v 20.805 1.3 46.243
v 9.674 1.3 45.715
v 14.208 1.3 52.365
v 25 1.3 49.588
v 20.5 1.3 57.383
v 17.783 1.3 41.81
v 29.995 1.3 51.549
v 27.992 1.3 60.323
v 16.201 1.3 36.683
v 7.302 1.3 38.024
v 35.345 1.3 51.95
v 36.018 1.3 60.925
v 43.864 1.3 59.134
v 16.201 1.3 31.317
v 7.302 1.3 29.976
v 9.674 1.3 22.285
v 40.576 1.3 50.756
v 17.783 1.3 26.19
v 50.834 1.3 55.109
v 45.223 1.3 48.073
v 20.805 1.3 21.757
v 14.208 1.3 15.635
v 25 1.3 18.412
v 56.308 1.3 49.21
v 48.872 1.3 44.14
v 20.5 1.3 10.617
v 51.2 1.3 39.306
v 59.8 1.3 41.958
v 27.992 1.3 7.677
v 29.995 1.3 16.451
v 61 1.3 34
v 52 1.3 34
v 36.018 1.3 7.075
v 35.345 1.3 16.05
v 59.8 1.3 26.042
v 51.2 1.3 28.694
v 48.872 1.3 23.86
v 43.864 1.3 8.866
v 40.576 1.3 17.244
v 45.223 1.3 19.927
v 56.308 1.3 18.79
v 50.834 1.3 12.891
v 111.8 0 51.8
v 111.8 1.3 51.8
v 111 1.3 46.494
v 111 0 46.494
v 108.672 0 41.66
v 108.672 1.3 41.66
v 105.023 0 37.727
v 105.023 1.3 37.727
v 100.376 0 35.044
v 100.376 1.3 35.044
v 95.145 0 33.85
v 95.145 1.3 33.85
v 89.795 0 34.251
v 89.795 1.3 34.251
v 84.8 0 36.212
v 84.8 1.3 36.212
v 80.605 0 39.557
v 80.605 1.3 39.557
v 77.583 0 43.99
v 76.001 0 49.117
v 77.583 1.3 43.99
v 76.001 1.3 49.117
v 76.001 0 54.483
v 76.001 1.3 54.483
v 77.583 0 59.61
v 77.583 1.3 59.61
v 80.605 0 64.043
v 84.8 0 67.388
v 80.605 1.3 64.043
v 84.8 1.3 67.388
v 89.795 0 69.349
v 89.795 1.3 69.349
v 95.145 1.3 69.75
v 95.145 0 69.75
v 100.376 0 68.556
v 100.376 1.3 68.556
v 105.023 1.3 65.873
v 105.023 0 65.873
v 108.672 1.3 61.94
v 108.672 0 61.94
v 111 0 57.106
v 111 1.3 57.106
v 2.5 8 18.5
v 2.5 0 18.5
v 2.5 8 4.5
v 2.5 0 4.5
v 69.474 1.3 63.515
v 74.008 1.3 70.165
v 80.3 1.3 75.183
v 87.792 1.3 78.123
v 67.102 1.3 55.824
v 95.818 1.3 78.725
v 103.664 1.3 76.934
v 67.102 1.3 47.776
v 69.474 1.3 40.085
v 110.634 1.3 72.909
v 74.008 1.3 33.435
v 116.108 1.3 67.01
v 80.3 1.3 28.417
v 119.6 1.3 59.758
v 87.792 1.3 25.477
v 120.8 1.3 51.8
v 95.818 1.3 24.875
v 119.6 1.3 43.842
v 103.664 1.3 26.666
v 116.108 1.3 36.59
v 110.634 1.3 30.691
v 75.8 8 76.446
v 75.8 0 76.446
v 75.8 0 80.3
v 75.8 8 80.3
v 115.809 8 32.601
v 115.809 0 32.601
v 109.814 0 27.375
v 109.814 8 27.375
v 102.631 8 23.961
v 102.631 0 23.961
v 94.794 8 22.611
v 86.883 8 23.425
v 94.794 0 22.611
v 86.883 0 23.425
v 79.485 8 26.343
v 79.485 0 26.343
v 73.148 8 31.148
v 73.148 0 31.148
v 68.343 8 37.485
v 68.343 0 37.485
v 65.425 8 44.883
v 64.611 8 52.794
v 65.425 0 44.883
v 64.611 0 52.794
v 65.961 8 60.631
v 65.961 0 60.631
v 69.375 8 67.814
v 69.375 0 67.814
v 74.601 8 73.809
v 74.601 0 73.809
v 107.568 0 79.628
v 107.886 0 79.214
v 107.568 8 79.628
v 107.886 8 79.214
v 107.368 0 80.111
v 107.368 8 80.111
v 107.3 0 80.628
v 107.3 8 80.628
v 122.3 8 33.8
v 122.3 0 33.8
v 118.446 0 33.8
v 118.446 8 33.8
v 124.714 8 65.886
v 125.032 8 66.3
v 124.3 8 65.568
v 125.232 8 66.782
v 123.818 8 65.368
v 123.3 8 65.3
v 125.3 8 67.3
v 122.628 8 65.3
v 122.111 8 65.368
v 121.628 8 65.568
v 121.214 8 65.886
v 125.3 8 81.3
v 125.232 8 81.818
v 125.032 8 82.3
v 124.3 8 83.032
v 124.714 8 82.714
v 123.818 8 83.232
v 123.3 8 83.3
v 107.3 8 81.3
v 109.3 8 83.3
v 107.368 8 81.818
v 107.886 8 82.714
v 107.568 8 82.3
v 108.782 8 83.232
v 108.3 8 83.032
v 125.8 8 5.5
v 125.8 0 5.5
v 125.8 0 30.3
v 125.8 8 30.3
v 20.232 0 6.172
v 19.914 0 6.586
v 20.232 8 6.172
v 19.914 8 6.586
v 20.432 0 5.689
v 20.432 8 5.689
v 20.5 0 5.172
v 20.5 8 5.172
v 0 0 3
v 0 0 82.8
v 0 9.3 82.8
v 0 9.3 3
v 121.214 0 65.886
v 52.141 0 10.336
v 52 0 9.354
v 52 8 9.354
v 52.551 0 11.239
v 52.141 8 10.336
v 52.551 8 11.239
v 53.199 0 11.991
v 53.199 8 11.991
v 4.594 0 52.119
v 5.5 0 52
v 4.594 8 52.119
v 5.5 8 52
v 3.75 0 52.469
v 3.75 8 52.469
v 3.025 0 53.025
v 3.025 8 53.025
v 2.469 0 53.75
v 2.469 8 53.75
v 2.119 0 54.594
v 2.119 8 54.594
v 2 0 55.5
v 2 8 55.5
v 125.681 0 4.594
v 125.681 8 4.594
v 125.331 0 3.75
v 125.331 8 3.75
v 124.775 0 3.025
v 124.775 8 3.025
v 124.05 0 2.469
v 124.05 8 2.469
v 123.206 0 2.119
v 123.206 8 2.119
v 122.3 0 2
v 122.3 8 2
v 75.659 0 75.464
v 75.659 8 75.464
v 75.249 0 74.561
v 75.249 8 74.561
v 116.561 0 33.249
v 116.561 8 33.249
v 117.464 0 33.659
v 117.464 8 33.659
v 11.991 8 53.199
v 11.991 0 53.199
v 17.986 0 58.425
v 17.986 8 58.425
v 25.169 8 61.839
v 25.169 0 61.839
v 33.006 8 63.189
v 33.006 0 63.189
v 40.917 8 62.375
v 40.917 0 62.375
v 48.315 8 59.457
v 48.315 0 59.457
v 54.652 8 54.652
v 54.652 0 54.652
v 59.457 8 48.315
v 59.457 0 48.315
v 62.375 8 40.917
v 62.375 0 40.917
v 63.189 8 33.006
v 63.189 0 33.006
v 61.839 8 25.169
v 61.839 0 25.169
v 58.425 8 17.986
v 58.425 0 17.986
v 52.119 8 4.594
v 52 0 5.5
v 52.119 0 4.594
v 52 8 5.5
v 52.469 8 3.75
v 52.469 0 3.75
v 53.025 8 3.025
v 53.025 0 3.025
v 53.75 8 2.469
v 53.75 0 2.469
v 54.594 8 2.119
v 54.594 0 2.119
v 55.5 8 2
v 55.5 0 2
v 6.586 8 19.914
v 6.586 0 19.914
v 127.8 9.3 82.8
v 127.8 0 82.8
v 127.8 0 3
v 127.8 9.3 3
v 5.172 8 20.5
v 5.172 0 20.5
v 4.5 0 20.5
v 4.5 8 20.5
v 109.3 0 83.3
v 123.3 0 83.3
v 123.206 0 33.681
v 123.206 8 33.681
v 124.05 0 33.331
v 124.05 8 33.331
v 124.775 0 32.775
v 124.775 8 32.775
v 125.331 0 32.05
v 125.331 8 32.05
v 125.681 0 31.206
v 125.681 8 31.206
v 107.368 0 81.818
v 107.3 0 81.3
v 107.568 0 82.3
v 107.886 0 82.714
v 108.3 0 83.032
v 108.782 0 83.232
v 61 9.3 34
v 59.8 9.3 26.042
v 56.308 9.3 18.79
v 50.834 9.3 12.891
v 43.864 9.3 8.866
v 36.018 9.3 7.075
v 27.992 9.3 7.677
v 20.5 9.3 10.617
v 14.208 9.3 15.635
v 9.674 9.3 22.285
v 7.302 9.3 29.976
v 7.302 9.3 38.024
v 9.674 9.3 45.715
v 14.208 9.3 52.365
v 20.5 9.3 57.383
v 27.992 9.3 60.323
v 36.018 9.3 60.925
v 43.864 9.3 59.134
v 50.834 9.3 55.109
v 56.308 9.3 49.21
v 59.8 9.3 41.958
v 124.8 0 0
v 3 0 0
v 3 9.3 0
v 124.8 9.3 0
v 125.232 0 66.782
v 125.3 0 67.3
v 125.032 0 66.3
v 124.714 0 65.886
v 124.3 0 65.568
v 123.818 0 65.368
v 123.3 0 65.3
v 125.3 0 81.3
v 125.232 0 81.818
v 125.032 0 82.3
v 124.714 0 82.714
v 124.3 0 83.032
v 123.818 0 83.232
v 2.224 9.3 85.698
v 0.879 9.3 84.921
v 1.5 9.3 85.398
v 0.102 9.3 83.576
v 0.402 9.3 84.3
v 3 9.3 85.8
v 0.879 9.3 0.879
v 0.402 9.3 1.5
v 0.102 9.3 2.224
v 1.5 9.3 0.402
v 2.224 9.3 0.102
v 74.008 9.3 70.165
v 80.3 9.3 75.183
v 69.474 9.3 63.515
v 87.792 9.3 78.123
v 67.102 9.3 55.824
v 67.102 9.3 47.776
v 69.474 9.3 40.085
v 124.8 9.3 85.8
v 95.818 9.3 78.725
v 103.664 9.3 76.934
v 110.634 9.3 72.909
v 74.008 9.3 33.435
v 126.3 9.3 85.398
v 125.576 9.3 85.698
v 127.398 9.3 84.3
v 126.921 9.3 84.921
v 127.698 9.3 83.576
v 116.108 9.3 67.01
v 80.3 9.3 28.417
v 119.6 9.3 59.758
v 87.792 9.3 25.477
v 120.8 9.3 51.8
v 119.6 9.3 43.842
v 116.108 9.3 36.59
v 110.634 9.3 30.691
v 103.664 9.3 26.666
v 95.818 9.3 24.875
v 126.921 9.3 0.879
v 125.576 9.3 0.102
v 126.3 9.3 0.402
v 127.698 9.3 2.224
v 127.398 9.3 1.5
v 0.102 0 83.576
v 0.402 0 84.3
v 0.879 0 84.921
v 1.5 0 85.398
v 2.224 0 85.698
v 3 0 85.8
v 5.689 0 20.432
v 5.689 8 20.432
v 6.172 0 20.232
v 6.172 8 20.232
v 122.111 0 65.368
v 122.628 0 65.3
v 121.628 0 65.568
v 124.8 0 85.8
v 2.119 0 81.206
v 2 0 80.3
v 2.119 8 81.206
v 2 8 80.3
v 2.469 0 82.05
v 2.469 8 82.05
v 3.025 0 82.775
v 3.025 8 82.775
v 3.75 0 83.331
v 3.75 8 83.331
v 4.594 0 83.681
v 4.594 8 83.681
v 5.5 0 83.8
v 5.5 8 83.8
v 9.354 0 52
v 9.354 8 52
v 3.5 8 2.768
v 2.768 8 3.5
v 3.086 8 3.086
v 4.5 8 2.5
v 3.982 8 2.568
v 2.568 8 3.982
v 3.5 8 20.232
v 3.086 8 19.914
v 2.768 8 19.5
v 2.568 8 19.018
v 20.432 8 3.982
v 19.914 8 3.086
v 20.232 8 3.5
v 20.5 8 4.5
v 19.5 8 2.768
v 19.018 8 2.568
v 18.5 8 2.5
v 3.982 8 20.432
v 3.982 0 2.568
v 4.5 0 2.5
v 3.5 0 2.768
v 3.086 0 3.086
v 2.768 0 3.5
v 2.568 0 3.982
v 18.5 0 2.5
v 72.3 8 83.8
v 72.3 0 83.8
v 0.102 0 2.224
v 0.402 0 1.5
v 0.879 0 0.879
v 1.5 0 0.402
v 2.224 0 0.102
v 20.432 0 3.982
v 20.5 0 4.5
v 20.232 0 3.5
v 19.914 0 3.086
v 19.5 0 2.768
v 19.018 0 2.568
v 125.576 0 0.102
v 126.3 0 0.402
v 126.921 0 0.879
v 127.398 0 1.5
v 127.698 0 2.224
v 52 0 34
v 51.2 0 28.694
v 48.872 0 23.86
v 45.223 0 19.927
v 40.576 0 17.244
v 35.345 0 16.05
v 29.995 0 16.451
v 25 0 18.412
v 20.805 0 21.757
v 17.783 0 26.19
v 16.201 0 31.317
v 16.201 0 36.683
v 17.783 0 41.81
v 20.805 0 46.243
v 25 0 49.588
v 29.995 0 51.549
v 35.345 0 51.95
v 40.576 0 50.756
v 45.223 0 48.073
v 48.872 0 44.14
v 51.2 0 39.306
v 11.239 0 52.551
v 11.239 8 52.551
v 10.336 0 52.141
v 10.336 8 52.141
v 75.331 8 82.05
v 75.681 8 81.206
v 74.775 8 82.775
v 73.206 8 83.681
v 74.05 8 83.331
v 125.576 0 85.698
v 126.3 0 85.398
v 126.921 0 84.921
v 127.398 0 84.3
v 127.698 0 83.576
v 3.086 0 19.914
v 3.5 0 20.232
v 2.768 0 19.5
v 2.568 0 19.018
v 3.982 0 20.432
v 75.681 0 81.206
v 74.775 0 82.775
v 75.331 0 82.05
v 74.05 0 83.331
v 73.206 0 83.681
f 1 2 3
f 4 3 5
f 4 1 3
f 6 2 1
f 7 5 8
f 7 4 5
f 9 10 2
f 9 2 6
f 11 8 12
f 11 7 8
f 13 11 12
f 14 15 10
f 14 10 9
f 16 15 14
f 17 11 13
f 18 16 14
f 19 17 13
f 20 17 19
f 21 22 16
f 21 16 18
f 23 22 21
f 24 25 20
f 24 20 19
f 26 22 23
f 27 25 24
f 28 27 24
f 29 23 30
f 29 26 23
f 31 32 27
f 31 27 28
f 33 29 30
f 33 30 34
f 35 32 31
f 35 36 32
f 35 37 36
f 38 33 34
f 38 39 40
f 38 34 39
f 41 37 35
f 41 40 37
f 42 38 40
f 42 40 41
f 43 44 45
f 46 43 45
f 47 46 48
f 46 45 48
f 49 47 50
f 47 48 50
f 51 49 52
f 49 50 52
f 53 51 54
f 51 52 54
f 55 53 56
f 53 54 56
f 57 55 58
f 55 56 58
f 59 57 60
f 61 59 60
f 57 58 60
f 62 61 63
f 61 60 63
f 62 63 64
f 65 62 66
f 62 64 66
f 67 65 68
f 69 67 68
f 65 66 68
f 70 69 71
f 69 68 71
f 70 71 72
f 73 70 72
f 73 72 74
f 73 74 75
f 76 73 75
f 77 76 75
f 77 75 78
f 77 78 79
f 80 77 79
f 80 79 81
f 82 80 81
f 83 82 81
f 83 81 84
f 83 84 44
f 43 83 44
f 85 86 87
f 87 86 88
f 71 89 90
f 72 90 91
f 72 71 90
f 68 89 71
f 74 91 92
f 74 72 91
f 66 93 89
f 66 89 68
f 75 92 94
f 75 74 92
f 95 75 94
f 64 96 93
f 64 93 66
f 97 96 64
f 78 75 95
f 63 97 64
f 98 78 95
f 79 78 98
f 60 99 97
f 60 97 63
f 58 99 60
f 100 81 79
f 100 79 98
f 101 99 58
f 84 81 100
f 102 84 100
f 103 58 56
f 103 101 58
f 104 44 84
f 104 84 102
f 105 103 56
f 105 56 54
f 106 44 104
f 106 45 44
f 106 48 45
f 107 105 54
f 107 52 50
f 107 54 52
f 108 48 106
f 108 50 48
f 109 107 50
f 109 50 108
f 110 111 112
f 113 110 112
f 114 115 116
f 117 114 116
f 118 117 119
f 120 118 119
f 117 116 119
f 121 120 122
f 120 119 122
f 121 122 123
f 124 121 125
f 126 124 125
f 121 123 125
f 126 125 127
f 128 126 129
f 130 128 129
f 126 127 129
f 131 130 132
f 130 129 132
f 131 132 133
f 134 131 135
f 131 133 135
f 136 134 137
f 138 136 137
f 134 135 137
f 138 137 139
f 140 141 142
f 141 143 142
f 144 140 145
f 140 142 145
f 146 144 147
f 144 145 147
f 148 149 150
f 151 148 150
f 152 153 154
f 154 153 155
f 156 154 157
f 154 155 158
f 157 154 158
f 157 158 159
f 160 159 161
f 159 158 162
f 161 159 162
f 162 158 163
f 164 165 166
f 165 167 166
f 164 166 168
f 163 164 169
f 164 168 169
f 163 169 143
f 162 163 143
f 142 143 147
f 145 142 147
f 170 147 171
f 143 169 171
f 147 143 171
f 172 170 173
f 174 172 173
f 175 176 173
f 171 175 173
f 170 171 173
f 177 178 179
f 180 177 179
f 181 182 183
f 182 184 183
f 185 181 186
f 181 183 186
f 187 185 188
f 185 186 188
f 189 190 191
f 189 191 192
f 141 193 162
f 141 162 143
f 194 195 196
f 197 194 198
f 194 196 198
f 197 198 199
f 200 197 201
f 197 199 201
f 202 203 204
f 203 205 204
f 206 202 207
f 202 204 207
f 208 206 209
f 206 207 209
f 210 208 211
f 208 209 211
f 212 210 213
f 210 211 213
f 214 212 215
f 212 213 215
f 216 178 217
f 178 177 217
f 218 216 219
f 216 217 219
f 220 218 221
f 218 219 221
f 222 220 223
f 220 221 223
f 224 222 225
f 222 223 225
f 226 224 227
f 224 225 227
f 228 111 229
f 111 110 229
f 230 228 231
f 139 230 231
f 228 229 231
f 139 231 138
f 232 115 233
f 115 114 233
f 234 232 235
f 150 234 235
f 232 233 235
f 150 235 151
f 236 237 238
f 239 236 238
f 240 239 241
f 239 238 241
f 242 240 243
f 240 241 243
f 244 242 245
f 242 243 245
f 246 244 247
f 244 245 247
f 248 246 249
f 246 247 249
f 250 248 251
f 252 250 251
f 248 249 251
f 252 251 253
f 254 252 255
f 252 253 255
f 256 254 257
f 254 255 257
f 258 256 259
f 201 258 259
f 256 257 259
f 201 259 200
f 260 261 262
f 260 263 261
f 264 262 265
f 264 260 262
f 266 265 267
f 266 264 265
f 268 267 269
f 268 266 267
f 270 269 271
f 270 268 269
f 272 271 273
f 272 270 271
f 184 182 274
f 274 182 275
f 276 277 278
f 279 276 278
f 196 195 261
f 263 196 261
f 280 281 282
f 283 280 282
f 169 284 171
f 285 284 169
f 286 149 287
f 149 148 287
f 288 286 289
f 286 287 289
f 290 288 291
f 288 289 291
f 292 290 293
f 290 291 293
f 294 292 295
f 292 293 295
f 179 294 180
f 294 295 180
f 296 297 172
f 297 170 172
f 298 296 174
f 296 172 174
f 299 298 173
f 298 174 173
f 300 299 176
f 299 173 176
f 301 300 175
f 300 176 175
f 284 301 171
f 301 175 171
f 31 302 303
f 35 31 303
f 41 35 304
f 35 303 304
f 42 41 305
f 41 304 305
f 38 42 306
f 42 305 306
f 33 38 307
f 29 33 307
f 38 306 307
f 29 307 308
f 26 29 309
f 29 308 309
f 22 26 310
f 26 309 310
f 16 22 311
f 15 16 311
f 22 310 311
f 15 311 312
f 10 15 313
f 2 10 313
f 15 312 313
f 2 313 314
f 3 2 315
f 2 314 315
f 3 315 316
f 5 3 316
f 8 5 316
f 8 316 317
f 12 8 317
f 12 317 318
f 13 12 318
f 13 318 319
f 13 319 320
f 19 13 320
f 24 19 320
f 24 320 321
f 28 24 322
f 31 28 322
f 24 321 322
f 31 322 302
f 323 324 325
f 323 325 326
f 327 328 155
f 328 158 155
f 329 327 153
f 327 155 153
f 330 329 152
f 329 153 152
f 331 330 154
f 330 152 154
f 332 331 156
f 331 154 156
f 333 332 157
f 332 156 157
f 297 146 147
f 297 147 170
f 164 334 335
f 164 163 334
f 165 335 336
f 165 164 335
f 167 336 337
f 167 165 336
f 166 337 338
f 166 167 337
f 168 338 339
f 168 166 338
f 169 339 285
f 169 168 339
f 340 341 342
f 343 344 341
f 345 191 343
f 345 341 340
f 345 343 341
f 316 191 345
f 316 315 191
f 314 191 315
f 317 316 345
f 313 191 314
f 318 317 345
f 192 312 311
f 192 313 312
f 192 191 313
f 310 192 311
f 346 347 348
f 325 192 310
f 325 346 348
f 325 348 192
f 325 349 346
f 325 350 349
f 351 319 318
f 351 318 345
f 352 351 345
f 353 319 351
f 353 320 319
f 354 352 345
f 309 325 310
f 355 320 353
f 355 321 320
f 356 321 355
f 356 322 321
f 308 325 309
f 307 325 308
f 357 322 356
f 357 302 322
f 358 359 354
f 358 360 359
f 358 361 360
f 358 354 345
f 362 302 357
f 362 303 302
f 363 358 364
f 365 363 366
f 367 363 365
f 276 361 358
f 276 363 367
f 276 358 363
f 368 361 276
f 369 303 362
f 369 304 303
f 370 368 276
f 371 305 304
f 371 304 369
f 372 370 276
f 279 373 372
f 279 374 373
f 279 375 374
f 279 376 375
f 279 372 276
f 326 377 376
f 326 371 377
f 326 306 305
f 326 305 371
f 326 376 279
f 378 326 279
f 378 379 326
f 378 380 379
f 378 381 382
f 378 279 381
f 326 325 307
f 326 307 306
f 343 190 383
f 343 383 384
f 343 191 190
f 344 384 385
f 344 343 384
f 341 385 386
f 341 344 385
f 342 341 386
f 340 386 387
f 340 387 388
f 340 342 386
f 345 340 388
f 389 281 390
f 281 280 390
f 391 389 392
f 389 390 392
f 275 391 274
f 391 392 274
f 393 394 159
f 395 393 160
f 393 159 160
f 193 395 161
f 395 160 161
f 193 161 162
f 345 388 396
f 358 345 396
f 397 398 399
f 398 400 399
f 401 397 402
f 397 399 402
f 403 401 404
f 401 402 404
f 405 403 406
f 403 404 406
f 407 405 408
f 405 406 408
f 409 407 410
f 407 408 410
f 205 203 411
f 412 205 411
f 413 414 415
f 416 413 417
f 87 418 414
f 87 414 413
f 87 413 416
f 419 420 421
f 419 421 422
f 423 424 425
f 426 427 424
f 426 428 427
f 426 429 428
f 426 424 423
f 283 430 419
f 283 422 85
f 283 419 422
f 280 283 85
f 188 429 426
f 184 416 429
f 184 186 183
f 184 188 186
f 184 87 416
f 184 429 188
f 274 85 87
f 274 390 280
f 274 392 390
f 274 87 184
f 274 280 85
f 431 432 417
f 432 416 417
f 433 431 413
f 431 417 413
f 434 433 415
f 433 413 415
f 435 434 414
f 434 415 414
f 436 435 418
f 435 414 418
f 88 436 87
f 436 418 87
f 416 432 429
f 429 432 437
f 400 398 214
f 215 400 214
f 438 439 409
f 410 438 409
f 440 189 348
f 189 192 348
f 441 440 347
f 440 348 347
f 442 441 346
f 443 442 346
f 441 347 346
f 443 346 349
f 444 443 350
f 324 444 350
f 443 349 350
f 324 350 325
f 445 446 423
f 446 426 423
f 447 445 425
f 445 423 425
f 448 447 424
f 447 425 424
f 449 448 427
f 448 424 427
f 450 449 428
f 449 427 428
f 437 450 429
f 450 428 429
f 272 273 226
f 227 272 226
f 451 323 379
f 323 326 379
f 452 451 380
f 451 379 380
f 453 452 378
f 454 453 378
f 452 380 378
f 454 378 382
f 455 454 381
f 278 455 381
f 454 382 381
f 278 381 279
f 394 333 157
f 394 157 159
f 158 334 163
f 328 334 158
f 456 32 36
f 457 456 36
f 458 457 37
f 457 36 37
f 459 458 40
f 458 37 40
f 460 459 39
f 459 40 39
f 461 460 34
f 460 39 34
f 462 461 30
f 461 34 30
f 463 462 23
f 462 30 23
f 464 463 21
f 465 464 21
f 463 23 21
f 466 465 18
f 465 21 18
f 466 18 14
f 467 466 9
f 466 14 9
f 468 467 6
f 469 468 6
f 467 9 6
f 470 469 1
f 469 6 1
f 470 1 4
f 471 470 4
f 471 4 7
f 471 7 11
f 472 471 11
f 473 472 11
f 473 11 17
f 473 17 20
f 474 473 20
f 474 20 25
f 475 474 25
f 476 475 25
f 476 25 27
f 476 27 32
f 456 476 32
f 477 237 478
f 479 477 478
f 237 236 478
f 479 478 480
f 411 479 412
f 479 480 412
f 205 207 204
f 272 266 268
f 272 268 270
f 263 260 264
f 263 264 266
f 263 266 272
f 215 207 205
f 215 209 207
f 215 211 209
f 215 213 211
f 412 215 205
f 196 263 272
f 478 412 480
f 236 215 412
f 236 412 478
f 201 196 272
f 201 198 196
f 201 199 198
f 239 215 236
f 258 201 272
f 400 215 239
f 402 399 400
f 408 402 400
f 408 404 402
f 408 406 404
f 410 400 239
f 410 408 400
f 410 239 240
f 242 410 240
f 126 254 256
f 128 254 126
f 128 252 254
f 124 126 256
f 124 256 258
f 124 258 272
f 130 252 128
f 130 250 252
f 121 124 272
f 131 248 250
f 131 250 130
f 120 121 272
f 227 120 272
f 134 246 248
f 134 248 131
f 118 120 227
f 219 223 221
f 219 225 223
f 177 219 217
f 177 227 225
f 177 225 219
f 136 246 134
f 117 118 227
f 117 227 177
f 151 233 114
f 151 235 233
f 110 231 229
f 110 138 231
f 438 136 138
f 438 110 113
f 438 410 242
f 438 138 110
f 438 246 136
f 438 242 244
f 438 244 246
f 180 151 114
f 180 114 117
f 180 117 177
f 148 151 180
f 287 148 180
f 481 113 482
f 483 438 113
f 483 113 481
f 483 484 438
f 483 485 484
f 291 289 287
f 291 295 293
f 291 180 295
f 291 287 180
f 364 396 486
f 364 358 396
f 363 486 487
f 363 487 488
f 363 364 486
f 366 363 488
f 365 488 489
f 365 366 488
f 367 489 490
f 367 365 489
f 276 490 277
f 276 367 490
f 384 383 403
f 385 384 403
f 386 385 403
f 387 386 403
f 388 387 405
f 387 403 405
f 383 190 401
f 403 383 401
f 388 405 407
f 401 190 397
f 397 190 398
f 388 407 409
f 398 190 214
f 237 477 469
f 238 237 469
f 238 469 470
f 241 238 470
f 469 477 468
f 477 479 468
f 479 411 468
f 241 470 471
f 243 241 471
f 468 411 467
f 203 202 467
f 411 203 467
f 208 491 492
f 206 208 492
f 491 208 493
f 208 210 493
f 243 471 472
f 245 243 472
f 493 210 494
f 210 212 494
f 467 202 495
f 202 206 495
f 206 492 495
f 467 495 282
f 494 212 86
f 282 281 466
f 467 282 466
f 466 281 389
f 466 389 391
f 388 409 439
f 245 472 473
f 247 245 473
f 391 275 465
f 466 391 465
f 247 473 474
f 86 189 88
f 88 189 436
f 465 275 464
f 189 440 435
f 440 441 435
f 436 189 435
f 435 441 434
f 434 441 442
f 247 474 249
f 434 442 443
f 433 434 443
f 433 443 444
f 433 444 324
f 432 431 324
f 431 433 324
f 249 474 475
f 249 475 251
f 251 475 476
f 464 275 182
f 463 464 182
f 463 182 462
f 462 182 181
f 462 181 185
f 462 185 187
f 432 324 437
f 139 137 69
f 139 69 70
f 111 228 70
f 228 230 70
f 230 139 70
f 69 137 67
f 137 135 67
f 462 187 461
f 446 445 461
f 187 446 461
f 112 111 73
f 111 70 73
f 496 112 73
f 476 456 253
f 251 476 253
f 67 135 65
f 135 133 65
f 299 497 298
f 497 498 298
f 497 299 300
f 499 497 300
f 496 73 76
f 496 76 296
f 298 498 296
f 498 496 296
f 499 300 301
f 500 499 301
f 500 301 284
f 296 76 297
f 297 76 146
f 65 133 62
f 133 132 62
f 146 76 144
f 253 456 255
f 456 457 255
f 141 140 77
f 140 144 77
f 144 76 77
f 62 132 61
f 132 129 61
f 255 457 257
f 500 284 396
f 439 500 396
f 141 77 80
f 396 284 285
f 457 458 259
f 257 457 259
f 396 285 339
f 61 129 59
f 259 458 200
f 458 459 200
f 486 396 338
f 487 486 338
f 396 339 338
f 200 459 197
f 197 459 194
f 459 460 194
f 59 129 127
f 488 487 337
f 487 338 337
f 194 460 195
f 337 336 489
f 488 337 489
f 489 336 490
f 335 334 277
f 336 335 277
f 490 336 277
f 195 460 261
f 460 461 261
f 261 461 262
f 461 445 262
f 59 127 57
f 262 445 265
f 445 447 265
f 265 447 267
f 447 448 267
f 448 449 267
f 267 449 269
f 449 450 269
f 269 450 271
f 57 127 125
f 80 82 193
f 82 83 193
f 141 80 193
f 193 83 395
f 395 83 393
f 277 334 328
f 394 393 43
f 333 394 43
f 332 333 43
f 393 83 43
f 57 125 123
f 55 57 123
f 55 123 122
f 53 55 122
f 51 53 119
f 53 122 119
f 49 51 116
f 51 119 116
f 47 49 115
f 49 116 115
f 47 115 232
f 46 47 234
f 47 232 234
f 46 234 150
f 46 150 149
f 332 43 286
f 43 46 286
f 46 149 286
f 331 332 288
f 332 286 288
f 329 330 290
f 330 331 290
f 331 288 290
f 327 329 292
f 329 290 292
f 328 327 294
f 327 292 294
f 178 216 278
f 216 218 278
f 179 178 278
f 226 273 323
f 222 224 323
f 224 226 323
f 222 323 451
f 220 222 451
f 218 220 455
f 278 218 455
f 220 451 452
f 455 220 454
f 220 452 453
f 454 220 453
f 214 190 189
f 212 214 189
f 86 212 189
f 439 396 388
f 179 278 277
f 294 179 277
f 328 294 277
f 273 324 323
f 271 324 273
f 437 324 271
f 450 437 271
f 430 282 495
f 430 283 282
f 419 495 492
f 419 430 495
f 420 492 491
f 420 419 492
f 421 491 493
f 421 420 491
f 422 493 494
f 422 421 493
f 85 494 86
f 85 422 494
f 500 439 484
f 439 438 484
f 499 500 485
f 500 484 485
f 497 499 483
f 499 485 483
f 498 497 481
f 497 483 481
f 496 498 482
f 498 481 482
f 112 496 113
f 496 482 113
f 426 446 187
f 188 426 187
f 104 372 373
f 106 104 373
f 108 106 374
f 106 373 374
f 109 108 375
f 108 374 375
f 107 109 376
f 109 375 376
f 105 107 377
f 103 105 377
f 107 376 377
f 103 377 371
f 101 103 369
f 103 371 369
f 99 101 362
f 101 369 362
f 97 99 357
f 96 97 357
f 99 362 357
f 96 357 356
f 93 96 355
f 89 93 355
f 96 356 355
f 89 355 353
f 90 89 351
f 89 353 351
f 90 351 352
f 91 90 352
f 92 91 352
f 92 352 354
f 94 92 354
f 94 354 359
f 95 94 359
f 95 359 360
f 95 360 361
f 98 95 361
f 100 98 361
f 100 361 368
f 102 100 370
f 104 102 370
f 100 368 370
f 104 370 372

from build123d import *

# Parameters (mm, degrees)
SKETCH1_W           = 127.8
SKETCH1_H           = 85.8
BOSS_EXTRUDE1_DEPTH = 9.3
SKETCH2_R           = 27
CUT_EXTRUDE1_DEPTH  = 8
SKETCH3_R           = 18
CUT_EXTRUDE2_DEPTH  = 9
FILLET1_R           = 3
CUT_EXTRUDE3_DEPTH  = 8
FILLET2_R           = 2
FILLET3_R           = 3.5


with BuildPart() as part:
    # Sketch1 → Boss-Extrude1 (new body)
    with BuildSketch(Plane(origin=(0, 0, 0), x_dir=(1, 0, 0), z_dir=(0, 1, 0))):
        with Locations((63.9, -42.9)):
            Rectangle(SKETCH1_W, SKETCH1_H)
    extrude(amount=BOSS_EXTRUDE1_DEPTH)

    # Sketch2 → Cut-Extrude1 (cut)
    with BuildSketch(Plane(origin=(0, 9.3, 0), x_dir=(1, 0, 0), z_dir=(0, 1, 0))):
        with Locations((93.8, -51.8)):
            Circle(SKETCH2_R)
        with Locations((34, -34)):
            Circle(SKETCH2_R)
    extrude(amount=-CUT_EXTRUDE1_DEPTH, mode=Mode.SUBTRACT)

    # Sketch3 → Cut-Extrude2 (cut)
    with BuildSketch(Plane(origin=(0, 1.3, 0), x_dir=(1, 0, 0), z_dir=(0, 1, 0))):
        with Locations((93.8, -51.8)):
            Circle(SKETCH3_R)
        with Locations((34, -34)):
            Circle(SKETCH3_R)
    extrude(amount=-CUT_EXTRUDE2_DEPTH, mode=Mode.SUBTRACT)

    # Fillet1
    fillet1_edges = [part.edges().sort_by_distance(p)[0] for p in [
        (0, 4.65, 0),
        (127.8, 4.65, 0),
        (127.8, 4.65, 85.8),
        (0, 4.65, 85.8),
    ]]
    fillet(fillet1_edges, radius=FILLET1_R)

    # Sketch4 → Cut-Extrude3 (cut)
    with BuildSketch(Plane.XZ):
        with BuildLine():
            Line((52, 2), (124.8, 2))
            Line((124.8, 2), (125.8, 2))
            Line((125.8, 2), (125.8, 3))
            Line((125.8, 3), (125.8, 33.8))
            Line((125.8, 33.8), (116.8, 33.8))
            ThreePointArc((116.8, 33.8), (73.148123572, 31.148123572), (75.8, 74.8))
            Line((75.8, 74.8), (75.8, 83.8))
            Line((75.8, 83.8), (3, 83.8))
            Line((3, 83.8), (2, 83.8))
            Line((2, 83.8), (2, 82.8))
            Line((2, 82.8), (2, 52))
            Line((2, 52), (11, 52))
            ThreePointArc((11, 52), (54.651876428, 54.651876428), (52, 11))
            Line((52, 11), (52, 2))
        make_face()
        Polygon((125.3, 83.3), (125.3, 65.3), (121.8, 65.3), (107.3, 79.8), (107.3, 83.3), align=None)
        Polygon((2.5, 20.5), (2.5, 2.5), (20.5, 2.5), (20.5, 6), (6, 20.5), align=None)
    extrude(amount=-CUT_EXTRUDE3_DEPTH, mode=Mode.SUBTRACT)

    # Fillet2
    fillet2_edges = [part.edges().sort_by_distance(p)[0] for p in [
        (2.5, 4, 20.5),
        (6, 4, 20.5),
        (20.5, 4, 6),
        (20.5, 4, 2.5),
        (2.5, 4, 2.5),
        (121.8, 4, 65.3),
        (107.3, 4, 79.8),
        (107.3, 4, 83.3),
        (125.3, 4, 83.3),
        (125.3, 4, 65.3),
    ]]
    fillet(fillet2_edges, radius=FILLET2_R)

    # Fillet3
    fillet3_edges = [part.edges().sort_by_distance(p)[0] for p in [
        (125.8, 4, 2),
        (52, 4, 2),
        (52, 4, 11),
        (11, 4, 52),
        (2, 4, 52),
        (2, 4, 83.8),
        (75.8, 4, 83.8),
        (75.8, 4, 74.8),
        (116.8, 4, 33.8),
        (125.8, 4, 33.8),
    ]]
    fillet(fillet3_edges, radius=FILLET3_R)


solid = part.part
